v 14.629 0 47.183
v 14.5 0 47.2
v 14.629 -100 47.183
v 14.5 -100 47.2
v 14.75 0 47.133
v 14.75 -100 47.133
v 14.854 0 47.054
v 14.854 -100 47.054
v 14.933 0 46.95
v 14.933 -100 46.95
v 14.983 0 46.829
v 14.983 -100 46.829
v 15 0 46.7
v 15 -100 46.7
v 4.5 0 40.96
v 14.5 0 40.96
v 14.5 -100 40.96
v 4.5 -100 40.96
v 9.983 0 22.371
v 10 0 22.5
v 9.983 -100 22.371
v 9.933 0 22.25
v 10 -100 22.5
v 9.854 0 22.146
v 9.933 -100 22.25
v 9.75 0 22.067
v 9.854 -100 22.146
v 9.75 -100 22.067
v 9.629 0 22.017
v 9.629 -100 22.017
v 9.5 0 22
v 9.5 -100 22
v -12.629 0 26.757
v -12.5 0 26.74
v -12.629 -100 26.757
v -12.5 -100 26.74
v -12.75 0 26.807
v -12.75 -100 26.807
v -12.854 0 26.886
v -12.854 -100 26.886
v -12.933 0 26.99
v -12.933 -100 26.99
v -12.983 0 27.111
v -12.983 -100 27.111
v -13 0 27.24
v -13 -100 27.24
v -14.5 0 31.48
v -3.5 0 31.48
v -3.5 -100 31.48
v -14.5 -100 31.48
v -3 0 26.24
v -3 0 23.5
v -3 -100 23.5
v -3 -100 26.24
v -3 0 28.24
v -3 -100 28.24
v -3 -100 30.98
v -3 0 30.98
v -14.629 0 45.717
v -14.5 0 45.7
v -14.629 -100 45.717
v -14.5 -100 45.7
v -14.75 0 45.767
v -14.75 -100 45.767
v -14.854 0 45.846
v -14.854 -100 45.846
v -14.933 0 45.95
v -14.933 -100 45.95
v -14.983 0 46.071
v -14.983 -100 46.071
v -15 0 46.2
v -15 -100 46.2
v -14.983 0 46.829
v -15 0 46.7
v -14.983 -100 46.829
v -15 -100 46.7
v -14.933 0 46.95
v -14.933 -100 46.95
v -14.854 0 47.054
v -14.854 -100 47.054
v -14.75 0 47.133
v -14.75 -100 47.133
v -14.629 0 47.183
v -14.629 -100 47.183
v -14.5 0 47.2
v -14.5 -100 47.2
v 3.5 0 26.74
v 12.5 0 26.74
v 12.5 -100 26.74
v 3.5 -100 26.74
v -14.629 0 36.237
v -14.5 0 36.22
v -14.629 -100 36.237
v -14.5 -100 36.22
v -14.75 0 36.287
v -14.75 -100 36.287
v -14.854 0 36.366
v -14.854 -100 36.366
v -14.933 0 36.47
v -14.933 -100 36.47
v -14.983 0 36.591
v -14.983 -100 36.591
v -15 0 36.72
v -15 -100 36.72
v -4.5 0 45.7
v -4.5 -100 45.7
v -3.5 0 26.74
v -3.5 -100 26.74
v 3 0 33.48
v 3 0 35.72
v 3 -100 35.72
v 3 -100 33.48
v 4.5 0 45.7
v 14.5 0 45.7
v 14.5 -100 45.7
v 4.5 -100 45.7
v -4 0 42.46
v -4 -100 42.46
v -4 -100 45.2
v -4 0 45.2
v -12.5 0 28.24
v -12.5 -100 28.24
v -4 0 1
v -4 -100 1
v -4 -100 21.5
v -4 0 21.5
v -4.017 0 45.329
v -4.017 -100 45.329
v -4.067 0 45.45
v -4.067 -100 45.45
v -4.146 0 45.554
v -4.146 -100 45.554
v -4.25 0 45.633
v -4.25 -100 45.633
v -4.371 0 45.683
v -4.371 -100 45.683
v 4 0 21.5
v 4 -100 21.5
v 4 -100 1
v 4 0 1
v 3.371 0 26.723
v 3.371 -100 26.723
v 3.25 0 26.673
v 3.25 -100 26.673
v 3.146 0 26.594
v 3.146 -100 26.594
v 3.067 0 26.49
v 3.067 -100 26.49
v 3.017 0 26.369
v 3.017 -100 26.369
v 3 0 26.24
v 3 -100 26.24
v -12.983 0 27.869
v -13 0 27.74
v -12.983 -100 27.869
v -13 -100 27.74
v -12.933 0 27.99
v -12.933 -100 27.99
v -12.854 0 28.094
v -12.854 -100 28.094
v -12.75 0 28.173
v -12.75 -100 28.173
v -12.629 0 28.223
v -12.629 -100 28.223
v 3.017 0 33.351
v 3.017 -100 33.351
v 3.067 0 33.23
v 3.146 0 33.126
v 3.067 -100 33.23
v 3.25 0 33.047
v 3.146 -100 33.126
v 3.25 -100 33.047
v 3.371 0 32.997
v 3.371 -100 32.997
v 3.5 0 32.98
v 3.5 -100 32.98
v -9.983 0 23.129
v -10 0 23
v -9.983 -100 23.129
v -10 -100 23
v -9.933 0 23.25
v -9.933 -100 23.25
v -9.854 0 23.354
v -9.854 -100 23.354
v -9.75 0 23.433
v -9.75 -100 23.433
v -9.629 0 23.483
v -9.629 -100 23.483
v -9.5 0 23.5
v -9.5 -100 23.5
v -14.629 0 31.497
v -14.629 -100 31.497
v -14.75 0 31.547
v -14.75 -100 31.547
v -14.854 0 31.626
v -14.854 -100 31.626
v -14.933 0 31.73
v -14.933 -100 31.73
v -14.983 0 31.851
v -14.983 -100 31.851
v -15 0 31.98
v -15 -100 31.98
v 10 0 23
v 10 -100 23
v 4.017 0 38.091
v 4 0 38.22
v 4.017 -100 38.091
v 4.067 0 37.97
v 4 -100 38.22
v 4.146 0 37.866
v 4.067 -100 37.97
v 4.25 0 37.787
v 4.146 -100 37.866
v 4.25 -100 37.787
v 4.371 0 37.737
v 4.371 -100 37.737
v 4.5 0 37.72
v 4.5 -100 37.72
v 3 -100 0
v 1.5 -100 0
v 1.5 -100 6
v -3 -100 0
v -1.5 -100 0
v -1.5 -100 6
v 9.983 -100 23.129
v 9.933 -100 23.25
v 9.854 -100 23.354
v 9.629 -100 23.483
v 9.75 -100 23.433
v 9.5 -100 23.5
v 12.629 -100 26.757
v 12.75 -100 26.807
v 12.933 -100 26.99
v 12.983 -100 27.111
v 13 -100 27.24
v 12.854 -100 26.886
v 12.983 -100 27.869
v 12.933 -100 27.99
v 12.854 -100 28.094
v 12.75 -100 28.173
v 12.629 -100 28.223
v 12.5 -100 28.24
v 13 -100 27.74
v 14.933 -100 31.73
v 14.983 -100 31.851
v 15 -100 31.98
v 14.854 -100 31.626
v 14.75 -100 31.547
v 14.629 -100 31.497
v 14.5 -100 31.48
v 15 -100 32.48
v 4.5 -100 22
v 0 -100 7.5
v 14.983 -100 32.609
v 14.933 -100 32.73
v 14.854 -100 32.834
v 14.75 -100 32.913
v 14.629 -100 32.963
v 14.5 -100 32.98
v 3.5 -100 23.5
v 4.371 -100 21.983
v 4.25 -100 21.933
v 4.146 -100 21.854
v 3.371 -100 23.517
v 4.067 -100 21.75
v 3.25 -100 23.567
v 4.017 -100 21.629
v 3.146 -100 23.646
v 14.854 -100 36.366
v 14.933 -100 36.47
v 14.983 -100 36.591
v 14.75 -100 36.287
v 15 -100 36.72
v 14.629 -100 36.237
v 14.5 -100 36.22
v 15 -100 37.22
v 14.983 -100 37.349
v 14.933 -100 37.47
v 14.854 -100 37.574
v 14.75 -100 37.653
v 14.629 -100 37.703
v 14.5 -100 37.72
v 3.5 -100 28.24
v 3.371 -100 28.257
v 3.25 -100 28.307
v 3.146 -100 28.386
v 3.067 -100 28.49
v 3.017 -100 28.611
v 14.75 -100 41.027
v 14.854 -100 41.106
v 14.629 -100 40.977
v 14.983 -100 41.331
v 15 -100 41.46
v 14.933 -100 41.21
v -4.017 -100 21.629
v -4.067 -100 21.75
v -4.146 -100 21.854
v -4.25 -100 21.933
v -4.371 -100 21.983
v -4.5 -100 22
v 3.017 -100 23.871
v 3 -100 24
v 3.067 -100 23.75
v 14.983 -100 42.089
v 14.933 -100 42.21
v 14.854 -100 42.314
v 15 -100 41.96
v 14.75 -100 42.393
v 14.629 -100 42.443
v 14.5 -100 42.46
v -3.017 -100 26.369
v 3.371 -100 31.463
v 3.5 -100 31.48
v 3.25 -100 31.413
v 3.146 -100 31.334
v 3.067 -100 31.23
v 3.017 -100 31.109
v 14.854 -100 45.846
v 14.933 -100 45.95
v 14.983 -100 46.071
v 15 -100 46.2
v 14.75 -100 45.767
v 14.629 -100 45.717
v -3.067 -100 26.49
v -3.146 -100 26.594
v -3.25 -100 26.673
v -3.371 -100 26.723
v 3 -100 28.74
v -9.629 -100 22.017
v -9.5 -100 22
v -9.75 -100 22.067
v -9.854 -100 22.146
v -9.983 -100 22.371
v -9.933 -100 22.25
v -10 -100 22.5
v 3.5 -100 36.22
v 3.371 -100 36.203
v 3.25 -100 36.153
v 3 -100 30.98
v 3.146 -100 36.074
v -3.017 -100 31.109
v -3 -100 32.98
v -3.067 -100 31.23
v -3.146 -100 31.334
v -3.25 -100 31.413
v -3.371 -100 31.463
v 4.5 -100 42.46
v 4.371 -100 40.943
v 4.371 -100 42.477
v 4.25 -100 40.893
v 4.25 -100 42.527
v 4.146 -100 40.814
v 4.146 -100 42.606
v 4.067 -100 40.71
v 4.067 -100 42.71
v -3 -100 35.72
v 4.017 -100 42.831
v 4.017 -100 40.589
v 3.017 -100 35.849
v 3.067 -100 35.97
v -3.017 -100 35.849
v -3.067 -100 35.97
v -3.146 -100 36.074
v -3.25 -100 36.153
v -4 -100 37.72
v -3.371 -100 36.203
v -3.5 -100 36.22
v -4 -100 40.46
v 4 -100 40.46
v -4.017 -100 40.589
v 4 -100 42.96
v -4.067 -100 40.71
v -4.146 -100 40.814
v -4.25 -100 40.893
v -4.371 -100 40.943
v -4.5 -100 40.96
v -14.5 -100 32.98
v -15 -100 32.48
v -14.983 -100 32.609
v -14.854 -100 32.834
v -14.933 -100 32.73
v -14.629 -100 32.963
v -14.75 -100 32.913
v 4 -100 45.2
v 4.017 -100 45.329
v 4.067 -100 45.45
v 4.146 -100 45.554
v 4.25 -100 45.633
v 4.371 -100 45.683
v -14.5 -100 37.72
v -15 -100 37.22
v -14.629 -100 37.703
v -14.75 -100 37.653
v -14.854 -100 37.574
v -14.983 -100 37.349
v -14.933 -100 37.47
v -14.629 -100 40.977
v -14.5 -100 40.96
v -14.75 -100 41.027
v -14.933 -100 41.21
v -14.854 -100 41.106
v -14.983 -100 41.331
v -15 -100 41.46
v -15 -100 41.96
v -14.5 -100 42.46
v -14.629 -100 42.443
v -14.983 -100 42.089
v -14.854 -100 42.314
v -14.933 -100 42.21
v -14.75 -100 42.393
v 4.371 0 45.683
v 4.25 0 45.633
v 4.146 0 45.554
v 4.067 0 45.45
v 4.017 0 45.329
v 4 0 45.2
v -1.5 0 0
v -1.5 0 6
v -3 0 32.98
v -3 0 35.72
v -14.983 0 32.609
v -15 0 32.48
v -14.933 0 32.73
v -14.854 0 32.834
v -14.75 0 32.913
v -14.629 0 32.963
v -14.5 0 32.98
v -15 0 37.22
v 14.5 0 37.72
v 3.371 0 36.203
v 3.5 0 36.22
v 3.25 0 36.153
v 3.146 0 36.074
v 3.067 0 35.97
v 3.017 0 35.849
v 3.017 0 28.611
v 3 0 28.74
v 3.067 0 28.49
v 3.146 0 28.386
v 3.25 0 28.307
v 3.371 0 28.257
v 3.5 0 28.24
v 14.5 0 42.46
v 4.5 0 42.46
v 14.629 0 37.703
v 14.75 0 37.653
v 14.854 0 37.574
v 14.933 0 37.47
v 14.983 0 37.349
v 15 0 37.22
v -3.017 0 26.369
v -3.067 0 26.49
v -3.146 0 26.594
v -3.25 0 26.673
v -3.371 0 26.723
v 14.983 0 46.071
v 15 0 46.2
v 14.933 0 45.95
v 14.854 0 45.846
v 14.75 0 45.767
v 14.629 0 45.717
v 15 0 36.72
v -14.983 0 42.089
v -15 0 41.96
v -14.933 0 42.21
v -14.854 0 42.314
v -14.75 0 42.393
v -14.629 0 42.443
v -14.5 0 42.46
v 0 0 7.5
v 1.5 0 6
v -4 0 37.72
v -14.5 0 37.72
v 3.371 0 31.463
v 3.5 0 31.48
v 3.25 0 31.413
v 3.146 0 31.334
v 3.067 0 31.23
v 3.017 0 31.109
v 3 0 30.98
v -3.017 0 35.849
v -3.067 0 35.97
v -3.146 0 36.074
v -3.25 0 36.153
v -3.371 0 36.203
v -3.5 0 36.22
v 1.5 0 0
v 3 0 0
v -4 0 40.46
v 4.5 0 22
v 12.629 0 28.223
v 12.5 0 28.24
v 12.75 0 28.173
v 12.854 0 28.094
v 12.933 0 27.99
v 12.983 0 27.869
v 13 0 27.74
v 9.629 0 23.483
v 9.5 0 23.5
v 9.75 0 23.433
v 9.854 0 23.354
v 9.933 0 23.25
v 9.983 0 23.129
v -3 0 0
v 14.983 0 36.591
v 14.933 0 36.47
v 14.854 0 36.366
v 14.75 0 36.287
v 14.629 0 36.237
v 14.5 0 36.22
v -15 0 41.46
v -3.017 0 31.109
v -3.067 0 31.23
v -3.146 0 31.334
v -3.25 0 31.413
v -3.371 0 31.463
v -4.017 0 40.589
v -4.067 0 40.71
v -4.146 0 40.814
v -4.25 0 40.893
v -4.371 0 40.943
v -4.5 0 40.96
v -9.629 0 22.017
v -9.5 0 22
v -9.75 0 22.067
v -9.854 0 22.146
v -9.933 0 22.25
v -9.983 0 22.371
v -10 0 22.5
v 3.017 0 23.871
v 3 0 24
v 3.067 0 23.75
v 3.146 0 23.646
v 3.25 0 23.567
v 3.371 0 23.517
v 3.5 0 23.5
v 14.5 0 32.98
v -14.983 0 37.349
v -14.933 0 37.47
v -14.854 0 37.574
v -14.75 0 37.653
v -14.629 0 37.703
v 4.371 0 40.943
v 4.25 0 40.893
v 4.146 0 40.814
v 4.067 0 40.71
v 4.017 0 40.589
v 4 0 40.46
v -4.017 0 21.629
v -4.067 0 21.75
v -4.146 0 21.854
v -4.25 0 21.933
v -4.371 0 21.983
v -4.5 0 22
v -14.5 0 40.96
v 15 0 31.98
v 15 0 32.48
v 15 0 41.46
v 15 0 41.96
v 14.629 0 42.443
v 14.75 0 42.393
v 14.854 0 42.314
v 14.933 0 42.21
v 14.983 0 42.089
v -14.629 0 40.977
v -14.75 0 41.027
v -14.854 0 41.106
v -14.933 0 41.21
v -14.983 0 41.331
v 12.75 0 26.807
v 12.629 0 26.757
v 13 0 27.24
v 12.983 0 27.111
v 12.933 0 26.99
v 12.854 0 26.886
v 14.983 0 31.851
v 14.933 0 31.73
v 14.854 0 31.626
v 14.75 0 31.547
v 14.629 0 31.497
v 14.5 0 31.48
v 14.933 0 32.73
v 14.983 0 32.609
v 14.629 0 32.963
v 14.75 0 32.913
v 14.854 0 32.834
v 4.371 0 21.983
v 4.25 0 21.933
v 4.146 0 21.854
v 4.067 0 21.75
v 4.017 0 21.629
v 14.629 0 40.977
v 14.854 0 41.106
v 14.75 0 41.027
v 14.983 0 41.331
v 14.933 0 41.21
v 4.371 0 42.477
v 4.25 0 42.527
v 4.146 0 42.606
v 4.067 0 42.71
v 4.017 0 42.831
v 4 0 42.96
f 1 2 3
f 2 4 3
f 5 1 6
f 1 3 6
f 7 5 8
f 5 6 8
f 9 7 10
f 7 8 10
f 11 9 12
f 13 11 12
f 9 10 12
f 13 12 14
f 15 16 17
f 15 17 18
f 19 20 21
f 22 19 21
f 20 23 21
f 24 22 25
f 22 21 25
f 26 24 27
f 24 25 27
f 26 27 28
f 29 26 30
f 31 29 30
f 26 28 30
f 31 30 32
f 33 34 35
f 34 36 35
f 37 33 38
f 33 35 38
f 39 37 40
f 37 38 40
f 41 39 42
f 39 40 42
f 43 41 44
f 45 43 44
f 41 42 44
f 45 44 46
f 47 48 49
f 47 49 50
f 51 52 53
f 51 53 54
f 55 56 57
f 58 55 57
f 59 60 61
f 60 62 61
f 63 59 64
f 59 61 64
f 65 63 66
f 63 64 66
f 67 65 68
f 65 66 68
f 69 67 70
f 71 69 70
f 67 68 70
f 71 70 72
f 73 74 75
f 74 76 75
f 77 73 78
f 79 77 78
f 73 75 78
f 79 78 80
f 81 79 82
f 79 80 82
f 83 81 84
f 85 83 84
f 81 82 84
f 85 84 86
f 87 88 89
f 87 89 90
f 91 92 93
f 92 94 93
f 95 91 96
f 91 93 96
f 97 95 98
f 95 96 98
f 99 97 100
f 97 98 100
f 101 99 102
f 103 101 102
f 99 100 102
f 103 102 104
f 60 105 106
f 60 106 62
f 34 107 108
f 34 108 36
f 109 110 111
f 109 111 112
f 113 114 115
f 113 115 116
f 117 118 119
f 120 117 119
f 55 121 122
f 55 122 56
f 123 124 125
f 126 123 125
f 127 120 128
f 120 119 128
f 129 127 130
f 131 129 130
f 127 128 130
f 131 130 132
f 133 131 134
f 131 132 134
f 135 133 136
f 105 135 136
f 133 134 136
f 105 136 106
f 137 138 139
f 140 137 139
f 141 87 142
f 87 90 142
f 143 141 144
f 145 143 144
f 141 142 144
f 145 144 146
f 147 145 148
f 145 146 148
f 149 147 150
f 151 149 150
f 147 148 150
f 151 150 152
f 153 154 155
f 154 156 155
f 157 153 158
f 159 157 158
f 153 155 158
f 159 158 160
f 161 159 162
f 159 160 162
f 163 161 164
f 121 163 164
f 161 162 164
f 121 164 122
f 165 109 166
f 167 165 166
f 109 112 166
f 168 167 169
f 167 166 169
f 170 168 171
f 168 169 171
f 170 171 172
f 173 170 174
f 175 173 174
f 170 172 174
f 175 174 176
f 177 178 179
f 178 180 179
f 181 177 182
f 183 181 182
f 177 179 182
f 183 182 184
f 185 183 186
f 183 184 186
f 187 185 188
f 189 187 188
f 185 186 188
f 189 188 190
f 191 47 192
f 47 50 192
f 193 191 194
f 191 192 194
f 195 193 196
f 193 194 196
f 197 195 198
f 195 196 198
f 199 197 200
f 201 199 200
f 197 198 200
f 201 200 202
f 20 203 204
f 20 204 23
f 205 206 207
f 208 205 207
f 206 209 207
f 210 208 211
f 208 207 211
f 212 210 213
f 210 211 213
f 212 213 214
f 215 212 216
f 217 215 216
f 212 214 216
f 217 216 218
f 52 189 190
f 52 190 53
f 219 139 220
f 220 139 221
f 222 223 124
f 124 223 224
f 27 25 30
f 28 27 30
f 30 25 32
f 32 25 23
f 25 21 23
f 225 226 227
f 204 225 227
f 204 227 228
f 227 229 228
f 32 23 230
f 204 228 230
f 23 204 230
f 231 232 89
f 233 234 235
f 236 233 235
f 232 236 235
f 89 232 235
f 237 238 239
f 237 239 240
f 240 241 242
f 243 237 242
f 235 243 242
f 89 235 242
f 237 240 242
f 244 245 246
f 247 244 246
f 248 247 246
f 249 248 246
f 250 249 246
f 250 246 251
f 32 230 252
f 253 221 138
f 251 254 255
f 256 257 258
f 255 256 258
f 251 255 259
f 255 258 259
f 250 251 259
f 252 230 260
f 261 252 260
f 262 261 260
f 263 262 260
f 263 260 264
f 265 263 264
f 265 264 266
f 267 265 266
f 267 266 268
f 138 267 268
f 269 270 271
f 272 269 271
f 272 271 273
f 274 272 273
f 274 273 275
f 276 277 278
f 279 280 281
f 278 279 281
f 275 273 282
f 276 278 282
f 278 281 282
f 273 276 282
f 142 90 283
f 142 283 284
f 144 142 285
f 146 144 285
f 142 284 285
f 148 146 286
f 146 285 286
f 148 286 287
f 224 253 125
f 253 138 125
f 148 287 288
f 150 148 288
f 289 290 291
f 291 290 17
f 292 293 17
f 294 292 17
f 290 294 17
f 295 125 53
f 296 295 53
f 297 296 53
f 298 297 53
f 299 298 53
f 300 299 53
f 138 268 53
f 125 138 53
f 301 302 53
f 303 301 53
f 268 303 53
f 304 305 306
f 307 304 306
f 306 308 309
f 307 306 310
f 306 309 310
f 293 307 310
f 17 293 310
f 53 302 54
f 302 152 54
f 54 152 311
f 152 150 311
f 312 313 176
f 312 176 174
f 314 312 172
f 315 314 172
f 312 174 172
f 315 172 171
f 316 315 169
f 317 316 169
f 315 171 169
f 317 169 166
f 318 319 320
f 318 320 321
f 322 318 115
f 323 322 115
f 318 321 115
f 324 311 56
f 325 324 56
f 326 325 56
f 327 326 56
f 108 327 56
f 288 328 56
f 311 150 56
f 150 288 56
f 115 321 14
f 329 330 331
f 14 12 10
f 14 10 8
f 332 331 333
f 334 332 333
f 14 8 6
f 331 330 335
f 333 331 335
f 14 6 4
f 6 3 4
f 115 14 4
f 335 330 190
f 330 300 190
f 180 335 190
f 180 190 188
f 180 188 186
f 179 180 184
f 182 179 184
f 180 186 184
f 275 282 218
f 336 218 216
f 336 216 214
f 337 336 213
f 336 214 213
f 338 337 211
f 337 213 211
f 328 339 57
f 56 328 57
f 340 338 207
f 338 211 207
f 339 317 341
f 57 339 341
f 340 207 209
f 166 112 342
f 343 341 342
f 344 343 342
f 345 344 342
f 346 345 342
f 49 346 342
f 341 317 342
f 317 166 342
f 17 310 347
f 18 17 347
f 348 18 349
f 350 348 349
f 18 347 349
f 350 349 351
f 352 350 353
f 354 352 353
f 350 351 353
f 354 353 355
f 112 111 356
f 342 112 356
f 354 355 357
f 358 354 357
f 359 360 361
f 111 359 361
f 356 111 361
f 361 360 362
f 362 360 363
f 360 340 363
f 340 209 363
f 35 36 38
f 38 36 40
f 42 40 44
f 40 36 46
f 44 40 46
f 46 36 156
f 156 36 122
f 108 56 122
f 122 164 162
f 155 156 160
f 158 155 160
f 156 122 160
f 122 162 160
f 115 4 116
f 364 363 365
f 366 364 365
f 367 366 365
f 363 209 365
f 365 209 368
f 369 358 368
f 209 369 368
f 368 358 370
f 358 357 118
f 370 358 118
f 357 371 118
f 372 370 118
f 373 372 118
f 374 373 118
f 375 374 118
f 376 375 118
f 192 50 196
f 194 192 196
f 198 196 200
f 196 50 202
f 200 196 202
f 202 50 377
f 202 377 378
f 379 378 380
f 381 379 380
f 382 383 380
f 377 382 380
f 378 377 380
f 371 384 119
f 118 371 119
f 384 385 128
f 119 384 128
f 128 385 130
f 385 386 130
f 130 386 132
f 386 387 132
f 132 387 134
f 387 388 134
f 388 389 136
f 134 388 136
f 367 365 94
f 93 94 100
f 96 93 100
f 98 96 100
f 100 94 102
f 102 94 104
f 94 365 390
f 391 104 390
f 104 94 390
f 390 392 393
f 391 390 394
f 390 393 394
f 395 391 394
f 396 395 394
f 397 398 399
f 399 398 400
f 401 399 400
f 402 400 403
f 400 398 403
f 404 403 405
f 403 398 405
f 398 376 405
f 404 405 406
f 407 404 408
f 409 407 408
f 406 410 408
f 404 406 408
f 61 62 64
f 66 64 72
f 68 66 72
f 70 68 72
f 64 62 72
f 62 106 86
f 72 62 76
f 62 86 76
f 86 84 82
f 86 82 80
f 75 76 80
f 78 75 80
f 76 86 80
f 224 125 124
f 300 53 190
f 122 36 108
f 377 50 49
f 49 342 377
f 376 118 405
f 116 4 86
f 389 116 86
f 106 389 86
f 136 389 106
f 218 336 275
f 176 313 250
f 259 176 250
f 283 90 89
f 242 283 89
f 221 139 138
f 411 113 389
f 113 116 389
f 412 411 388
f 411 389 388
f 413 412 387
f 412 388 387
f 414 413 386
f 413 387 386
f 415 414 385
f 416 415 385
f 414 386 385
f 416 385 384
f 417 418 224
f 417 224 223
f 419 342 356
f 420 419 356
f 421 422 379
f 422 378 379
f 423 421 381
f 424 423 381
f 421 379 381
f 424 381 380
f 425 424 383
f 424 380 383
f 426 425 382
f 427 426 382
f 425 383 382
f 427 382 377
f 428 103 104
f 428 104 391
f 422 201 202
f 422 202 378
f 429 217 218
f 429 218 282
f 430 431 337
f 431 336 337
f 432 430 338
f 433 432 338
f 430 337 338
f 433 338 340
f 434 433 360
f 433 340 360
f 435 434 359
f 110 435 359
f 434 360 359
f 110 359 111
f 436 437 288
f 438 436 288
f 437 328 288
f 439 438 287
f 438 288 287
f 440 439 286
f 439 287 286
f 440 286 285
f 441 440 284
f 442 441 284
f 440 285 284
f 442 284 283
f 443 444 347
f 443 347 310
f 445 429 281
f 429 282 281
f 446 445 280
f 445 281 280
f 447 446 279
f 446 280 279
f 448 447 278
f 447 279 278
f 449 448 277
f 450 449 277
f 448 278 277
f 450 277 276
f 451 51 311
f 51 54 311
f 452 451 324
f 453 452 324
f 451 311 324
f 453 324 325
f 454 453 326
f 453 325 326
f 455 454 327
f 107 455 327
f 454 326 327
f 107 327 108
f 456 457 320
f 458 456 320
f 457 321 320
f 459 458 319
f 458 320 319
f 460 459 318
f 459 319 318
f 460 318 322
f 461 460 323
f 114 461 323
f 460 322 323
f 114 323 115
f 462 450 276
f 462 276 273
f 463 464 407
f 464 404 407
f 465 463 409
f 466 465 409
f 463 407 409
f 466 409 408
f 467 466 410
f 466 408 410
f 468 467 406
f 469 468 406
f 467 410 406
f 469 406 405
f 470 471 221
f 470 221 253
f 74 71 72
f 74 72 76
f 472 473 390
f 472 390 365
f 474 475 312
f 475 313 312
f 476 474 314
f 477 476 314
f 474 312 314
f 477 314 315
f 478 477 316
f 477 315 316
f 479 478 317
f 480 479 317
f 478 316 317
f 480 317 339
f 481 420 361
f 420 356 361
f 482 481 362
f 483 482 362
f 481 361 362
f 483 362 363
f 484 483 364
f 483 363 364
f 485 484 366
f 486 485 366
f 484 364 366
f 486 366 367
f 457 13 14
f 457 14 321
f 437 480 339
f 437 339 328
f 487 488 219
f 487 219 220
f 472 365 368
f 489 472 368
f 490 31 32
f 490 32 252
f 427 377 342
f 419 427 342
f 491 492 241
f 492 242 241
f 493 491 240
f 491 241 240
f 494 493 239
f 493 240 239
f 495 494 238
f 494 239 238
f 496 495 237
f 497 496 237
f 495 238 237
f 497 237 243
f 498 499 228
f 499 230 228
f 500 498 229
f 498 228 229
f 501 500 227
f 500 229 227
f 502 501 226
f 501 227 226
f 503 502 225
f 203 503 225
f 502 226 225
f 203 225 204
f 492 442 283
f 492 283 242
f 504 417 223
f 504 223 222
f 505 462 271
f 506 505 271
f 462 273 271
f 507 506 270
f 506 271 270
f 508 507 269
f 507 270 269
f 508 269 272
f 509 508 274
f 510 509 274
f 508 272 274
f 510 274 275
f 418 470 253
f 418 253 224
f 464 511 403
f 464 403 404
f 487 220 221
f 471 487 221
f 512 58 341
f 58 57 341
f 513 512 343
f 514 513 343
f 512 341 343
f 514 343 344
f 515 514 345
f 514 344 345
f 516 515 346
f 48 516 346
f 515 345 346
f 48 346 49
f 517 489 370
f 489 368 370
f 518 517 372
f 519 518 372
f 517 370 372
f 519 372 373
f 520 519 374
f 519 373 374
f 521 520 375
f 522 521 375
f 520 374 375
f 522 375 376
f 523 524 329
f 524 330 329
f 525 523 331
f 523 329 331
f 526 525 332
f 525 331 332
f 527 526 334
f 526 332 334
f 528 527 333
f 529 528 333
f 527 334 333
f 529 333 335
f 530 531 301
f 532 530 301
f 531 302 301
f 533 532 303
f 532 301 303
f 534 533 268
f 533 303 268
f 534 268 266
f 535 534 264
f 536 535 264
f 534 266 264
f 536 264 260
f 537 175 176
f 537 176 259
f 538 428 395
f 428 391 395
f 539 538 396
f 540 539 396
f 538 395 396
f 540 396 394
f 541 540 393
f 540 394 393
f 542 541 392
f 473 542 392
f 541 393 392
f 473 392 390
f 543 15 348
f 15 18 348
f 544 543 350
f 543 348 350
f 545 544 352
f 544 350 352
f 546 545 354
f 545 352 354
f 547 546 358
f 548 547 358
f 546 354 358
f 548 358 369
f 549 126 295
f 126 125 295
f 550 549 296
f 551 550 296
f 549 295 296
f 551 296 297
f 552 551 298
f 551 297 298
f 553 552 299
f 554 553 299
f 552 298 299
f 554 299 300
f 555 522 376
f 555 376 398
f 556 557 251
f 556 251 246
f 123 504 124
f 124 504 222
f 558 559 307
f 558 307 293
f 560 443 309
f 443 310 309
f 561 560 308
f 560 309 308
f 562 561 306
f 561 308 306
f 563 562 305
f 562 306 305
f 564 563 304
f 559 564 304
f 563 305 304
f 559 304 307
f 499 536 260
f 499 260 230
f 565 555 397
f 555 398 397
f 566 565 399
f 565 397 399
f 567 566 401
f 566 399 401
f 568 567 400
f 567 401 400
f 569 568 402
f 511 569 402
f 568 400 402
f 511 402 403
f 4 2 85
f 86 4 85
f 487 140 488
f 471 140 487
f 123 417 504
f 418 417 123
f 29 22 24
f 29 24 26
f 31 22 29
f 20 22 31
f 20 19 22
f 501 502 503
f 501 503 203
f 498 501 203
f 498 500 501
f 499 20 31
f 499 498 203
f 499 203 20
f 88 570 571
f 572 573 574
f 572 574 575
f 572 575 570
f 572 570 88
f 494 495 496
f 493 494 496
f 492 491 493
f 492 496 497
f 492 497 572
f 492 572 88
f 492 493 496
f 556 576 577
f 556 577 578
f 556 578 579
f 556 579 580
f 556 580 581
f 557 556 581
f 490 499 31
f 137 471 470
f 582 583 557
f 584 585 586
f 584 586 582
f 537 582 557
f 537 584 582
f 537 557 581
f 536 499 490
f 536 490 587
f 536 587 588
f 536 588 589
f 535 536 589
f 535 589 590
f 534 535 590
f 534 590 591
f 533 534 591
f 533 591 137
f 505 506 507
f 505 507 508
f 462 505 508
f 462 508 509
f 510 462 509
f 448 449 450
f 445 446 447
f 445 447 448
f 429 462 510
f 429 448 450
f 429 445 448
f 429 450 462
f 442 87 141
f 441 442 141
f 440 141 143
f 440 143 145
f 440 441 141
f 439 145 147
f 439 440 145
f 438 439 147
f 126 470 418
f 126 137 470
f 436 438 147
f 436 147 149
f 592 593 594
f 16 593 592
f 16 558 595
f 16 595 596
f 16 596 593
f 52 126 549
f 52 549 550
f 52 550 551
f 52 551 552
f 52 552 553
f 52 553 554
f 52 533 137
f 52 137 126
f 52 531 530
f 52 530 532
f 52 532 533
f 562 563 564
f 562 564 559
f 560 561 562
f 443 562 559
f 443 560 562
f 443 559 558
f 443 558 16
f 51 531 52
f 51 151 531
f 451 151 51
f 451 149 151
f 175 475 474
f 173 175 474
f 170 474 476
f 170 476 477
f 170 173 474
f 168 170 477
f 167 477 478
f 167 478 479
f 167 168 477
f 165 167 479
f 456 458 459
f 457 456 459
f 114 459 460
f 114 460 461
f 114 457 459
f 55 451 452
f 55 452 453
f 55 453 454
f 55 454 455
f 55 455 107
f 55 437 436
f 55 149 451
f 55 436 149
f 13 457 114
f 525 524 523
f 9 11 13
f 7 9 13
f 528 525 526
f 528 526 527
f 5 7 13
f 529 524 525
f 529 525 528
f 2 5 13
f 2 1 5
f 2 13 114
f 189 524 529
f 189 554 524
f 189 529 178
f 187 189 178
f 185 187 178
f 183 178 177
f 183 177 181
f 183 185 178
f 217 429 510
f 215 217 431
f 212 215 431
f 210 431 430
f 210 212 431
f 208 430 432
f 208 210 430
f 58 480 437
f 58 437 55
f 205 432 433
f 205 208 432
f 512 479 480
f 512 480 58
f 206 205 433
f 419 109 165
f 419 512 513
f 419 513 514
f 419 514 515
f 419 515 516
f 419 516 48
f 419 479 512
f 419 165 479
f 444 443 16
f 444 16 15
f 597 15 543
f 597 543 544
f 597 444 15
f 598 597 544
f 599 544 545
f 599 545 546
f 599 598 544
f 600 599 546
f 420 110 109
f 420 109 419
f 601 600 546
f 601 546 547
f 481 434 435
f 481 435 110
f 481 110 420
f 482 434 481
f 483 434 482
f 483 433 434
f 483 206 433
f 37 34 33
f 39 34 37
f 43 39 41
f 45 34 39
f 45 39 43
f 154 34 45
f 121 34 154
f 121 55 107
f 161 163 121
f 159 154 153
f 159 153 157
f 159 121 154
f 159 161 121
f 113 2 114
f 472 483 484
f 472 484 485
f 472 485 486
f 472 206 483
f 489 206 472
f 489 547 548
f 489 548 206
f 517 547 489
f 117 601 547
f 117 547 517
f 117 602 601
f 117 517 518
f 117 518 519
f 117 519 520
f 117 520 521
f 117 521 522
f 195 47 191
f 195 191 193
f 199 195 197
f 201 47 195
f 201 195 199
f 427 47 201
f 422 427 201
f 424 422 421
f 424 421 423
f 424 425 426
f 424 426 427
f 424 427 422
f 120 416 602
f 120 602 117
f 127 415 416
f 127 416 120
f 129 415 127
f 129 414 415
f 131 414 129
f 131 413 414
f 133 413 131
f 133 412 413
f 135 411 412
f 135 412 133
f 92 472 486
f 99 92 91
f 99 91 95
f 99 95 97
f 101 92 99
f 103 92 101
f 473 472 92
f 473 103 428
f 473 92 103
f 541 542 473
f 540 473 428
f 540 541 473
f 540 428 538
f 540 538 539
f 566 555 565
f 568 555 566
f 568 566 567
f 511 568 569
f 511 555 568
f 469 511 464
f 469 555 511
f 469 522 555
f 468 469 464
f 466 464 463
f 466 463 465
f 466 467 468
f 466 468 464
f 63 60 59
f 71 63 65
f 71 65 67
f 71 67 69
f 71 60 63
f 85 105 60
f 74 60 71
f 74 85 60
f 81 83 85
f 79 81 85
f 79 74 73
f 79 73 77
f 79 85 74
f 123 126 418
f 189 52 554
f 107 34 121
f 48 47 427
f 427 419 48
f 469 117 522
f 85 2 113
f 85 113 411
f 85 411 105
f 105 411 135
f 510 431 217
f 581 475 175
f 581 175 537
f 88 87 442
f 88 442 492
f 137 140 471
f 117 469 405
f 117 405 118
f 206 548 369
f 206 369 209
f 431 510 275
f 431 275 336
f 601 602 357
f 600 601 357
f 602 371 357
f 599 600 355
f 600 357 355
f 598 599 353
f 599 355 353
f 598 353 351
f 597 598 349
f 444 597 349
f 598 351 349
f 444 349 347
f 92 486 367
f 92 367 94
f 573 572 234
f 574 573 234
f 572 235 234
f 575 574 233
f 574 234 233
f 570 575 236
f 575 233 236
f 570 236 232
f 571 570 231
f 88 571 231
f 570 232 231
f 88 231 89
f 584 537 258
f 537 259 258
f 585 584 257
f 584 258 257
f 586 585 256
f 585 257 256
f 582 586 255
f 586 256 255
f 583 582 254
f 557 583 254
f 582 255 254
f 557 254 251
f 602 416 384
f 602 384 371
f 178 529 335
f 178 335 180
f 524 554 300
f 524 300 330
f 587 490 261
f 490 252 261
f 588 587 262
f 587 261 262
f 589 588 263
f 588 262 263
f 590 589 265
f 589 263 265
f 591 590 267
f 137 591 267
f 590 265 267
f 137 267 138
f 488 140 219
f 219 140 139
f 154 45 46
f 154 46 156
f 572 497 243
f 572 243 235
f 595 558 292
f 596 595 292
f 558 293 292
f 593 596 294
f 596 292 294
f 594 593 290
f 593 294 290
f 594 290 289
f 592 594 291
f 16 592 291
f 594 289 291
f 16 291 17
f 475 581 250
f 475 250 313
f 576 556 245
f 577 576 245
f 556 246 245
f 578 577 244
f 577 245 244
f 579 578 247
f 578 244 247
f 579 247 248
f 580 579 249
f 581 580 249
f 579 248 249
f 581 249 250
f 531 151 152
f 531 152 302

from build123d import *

# Parameters (mm, degrees)
PAD_DEPTH    = 100
FILLET_R     = 0.5
CHAMFER_SIZE = 1


with BuildPart() as part:
    # Sketch → Pad (new body)
    with BuildSketch(Plane.XZ):
        Polygon((0, 7.5), (-1.5, 6), (-1.5, 0), (-4, 0), (-4, 22), (-10, 22), (-10, 23.5), (-3, 23.5), (-3, 26.74), (-13, 26.74), (-13, 28.24), (-3, 28.24), (-3, 31.48), (-15, 31.48), (-15, 32.98), (-3, 32.98), (-3, 36.22), (-15, 36.22), (-15, 37.72), (-4, 37.72), (-4, 40.96), (-15, 40.96), (-15, 42.46), (-4, 42.46), (-4, 45.7), (-15, 45.7), (-15, 47.2), (0, 47.2), (15, 47.2), (15, 45.7), (4, 45.7), (4, 42.46), (15, 42.46), (15, 40.96), (4, 40.96), (4, 37.72), (15, 37.72), (15, 36.22), (3, 36.22), (3, 32.98), (15, 32.98), (15, 31.48), (3, 31.48), (3, 28.24), (13, 28.24), (13, 26.74), (3, 26.74), (3, 23.5), (10, 23.5), (10, 22), (4, 22), (4, 0), (1.5, 0), (1.5, 6.000001), align=None)
    extrude(amount=PAD_DEPTH)

    # Fillet
    fillet_edges = [part.edges().sort_by_distance(p)[0] for p in [
        (3, -50, 28.24),
        (3, -50, 32.98),
        (4, -50, 37.72),
        (4, -50, 42.46),
        (3, -50, 23.5),
        (15, -50, 31.48),
        (13, -50, 26.74),
        (13, -50, 28.24),
        (15, -50, 32.98),
        (15, -50, 36.22),
        (15, -50, 37.72),
        (15, -50, 40.96),
        (15, -50, 42.46),
        (15, -50, 45.7),
        (15, -50, 47.2),
        (10, -50, 22),
        (10, -50, 23.5),
        (4, -50, 22),
        (3, -50, 26.74),
        (3, -50, 31.48),
        (3, -50, 36.22),
        (4, -50, 40.96),
        (4, -50, 45.7),
        (-4, -50, 22),
        (-10, -50, 22),
        (-10, -50, 23.5),
        (-3, -50, 26.74),
        (-13, -50, 26.74),
        (-13, -50, 28.24),
        (-3, -50, 31.48),
        (-15, -50, 31.48),
        (-15, -50, 32.98),
        (-3, -50, 36.22),
        (-15, -50, 36.22),
        (-15, -50, 37.72),
        (-4, -50, 40.96),
        (-15, -50, 40.96),
        (-15, -50, 42.46),
        (-4, -50, 45.7),
        (-15, -50, 45.7),
        (-15, -50, 47.2),
    ]]
    fillet(fillet_edges, radius=FILLET_R)

    # Chamfer
    chamfer_edges = [part.edges().sort_by_distance(p)[0] for p in [
        (4, -50, 0),
        (-4, -50, 0),
    ]]
    chamfer(chamfer_edges, length=CHAMFER_SIZE)


solid = part.part
